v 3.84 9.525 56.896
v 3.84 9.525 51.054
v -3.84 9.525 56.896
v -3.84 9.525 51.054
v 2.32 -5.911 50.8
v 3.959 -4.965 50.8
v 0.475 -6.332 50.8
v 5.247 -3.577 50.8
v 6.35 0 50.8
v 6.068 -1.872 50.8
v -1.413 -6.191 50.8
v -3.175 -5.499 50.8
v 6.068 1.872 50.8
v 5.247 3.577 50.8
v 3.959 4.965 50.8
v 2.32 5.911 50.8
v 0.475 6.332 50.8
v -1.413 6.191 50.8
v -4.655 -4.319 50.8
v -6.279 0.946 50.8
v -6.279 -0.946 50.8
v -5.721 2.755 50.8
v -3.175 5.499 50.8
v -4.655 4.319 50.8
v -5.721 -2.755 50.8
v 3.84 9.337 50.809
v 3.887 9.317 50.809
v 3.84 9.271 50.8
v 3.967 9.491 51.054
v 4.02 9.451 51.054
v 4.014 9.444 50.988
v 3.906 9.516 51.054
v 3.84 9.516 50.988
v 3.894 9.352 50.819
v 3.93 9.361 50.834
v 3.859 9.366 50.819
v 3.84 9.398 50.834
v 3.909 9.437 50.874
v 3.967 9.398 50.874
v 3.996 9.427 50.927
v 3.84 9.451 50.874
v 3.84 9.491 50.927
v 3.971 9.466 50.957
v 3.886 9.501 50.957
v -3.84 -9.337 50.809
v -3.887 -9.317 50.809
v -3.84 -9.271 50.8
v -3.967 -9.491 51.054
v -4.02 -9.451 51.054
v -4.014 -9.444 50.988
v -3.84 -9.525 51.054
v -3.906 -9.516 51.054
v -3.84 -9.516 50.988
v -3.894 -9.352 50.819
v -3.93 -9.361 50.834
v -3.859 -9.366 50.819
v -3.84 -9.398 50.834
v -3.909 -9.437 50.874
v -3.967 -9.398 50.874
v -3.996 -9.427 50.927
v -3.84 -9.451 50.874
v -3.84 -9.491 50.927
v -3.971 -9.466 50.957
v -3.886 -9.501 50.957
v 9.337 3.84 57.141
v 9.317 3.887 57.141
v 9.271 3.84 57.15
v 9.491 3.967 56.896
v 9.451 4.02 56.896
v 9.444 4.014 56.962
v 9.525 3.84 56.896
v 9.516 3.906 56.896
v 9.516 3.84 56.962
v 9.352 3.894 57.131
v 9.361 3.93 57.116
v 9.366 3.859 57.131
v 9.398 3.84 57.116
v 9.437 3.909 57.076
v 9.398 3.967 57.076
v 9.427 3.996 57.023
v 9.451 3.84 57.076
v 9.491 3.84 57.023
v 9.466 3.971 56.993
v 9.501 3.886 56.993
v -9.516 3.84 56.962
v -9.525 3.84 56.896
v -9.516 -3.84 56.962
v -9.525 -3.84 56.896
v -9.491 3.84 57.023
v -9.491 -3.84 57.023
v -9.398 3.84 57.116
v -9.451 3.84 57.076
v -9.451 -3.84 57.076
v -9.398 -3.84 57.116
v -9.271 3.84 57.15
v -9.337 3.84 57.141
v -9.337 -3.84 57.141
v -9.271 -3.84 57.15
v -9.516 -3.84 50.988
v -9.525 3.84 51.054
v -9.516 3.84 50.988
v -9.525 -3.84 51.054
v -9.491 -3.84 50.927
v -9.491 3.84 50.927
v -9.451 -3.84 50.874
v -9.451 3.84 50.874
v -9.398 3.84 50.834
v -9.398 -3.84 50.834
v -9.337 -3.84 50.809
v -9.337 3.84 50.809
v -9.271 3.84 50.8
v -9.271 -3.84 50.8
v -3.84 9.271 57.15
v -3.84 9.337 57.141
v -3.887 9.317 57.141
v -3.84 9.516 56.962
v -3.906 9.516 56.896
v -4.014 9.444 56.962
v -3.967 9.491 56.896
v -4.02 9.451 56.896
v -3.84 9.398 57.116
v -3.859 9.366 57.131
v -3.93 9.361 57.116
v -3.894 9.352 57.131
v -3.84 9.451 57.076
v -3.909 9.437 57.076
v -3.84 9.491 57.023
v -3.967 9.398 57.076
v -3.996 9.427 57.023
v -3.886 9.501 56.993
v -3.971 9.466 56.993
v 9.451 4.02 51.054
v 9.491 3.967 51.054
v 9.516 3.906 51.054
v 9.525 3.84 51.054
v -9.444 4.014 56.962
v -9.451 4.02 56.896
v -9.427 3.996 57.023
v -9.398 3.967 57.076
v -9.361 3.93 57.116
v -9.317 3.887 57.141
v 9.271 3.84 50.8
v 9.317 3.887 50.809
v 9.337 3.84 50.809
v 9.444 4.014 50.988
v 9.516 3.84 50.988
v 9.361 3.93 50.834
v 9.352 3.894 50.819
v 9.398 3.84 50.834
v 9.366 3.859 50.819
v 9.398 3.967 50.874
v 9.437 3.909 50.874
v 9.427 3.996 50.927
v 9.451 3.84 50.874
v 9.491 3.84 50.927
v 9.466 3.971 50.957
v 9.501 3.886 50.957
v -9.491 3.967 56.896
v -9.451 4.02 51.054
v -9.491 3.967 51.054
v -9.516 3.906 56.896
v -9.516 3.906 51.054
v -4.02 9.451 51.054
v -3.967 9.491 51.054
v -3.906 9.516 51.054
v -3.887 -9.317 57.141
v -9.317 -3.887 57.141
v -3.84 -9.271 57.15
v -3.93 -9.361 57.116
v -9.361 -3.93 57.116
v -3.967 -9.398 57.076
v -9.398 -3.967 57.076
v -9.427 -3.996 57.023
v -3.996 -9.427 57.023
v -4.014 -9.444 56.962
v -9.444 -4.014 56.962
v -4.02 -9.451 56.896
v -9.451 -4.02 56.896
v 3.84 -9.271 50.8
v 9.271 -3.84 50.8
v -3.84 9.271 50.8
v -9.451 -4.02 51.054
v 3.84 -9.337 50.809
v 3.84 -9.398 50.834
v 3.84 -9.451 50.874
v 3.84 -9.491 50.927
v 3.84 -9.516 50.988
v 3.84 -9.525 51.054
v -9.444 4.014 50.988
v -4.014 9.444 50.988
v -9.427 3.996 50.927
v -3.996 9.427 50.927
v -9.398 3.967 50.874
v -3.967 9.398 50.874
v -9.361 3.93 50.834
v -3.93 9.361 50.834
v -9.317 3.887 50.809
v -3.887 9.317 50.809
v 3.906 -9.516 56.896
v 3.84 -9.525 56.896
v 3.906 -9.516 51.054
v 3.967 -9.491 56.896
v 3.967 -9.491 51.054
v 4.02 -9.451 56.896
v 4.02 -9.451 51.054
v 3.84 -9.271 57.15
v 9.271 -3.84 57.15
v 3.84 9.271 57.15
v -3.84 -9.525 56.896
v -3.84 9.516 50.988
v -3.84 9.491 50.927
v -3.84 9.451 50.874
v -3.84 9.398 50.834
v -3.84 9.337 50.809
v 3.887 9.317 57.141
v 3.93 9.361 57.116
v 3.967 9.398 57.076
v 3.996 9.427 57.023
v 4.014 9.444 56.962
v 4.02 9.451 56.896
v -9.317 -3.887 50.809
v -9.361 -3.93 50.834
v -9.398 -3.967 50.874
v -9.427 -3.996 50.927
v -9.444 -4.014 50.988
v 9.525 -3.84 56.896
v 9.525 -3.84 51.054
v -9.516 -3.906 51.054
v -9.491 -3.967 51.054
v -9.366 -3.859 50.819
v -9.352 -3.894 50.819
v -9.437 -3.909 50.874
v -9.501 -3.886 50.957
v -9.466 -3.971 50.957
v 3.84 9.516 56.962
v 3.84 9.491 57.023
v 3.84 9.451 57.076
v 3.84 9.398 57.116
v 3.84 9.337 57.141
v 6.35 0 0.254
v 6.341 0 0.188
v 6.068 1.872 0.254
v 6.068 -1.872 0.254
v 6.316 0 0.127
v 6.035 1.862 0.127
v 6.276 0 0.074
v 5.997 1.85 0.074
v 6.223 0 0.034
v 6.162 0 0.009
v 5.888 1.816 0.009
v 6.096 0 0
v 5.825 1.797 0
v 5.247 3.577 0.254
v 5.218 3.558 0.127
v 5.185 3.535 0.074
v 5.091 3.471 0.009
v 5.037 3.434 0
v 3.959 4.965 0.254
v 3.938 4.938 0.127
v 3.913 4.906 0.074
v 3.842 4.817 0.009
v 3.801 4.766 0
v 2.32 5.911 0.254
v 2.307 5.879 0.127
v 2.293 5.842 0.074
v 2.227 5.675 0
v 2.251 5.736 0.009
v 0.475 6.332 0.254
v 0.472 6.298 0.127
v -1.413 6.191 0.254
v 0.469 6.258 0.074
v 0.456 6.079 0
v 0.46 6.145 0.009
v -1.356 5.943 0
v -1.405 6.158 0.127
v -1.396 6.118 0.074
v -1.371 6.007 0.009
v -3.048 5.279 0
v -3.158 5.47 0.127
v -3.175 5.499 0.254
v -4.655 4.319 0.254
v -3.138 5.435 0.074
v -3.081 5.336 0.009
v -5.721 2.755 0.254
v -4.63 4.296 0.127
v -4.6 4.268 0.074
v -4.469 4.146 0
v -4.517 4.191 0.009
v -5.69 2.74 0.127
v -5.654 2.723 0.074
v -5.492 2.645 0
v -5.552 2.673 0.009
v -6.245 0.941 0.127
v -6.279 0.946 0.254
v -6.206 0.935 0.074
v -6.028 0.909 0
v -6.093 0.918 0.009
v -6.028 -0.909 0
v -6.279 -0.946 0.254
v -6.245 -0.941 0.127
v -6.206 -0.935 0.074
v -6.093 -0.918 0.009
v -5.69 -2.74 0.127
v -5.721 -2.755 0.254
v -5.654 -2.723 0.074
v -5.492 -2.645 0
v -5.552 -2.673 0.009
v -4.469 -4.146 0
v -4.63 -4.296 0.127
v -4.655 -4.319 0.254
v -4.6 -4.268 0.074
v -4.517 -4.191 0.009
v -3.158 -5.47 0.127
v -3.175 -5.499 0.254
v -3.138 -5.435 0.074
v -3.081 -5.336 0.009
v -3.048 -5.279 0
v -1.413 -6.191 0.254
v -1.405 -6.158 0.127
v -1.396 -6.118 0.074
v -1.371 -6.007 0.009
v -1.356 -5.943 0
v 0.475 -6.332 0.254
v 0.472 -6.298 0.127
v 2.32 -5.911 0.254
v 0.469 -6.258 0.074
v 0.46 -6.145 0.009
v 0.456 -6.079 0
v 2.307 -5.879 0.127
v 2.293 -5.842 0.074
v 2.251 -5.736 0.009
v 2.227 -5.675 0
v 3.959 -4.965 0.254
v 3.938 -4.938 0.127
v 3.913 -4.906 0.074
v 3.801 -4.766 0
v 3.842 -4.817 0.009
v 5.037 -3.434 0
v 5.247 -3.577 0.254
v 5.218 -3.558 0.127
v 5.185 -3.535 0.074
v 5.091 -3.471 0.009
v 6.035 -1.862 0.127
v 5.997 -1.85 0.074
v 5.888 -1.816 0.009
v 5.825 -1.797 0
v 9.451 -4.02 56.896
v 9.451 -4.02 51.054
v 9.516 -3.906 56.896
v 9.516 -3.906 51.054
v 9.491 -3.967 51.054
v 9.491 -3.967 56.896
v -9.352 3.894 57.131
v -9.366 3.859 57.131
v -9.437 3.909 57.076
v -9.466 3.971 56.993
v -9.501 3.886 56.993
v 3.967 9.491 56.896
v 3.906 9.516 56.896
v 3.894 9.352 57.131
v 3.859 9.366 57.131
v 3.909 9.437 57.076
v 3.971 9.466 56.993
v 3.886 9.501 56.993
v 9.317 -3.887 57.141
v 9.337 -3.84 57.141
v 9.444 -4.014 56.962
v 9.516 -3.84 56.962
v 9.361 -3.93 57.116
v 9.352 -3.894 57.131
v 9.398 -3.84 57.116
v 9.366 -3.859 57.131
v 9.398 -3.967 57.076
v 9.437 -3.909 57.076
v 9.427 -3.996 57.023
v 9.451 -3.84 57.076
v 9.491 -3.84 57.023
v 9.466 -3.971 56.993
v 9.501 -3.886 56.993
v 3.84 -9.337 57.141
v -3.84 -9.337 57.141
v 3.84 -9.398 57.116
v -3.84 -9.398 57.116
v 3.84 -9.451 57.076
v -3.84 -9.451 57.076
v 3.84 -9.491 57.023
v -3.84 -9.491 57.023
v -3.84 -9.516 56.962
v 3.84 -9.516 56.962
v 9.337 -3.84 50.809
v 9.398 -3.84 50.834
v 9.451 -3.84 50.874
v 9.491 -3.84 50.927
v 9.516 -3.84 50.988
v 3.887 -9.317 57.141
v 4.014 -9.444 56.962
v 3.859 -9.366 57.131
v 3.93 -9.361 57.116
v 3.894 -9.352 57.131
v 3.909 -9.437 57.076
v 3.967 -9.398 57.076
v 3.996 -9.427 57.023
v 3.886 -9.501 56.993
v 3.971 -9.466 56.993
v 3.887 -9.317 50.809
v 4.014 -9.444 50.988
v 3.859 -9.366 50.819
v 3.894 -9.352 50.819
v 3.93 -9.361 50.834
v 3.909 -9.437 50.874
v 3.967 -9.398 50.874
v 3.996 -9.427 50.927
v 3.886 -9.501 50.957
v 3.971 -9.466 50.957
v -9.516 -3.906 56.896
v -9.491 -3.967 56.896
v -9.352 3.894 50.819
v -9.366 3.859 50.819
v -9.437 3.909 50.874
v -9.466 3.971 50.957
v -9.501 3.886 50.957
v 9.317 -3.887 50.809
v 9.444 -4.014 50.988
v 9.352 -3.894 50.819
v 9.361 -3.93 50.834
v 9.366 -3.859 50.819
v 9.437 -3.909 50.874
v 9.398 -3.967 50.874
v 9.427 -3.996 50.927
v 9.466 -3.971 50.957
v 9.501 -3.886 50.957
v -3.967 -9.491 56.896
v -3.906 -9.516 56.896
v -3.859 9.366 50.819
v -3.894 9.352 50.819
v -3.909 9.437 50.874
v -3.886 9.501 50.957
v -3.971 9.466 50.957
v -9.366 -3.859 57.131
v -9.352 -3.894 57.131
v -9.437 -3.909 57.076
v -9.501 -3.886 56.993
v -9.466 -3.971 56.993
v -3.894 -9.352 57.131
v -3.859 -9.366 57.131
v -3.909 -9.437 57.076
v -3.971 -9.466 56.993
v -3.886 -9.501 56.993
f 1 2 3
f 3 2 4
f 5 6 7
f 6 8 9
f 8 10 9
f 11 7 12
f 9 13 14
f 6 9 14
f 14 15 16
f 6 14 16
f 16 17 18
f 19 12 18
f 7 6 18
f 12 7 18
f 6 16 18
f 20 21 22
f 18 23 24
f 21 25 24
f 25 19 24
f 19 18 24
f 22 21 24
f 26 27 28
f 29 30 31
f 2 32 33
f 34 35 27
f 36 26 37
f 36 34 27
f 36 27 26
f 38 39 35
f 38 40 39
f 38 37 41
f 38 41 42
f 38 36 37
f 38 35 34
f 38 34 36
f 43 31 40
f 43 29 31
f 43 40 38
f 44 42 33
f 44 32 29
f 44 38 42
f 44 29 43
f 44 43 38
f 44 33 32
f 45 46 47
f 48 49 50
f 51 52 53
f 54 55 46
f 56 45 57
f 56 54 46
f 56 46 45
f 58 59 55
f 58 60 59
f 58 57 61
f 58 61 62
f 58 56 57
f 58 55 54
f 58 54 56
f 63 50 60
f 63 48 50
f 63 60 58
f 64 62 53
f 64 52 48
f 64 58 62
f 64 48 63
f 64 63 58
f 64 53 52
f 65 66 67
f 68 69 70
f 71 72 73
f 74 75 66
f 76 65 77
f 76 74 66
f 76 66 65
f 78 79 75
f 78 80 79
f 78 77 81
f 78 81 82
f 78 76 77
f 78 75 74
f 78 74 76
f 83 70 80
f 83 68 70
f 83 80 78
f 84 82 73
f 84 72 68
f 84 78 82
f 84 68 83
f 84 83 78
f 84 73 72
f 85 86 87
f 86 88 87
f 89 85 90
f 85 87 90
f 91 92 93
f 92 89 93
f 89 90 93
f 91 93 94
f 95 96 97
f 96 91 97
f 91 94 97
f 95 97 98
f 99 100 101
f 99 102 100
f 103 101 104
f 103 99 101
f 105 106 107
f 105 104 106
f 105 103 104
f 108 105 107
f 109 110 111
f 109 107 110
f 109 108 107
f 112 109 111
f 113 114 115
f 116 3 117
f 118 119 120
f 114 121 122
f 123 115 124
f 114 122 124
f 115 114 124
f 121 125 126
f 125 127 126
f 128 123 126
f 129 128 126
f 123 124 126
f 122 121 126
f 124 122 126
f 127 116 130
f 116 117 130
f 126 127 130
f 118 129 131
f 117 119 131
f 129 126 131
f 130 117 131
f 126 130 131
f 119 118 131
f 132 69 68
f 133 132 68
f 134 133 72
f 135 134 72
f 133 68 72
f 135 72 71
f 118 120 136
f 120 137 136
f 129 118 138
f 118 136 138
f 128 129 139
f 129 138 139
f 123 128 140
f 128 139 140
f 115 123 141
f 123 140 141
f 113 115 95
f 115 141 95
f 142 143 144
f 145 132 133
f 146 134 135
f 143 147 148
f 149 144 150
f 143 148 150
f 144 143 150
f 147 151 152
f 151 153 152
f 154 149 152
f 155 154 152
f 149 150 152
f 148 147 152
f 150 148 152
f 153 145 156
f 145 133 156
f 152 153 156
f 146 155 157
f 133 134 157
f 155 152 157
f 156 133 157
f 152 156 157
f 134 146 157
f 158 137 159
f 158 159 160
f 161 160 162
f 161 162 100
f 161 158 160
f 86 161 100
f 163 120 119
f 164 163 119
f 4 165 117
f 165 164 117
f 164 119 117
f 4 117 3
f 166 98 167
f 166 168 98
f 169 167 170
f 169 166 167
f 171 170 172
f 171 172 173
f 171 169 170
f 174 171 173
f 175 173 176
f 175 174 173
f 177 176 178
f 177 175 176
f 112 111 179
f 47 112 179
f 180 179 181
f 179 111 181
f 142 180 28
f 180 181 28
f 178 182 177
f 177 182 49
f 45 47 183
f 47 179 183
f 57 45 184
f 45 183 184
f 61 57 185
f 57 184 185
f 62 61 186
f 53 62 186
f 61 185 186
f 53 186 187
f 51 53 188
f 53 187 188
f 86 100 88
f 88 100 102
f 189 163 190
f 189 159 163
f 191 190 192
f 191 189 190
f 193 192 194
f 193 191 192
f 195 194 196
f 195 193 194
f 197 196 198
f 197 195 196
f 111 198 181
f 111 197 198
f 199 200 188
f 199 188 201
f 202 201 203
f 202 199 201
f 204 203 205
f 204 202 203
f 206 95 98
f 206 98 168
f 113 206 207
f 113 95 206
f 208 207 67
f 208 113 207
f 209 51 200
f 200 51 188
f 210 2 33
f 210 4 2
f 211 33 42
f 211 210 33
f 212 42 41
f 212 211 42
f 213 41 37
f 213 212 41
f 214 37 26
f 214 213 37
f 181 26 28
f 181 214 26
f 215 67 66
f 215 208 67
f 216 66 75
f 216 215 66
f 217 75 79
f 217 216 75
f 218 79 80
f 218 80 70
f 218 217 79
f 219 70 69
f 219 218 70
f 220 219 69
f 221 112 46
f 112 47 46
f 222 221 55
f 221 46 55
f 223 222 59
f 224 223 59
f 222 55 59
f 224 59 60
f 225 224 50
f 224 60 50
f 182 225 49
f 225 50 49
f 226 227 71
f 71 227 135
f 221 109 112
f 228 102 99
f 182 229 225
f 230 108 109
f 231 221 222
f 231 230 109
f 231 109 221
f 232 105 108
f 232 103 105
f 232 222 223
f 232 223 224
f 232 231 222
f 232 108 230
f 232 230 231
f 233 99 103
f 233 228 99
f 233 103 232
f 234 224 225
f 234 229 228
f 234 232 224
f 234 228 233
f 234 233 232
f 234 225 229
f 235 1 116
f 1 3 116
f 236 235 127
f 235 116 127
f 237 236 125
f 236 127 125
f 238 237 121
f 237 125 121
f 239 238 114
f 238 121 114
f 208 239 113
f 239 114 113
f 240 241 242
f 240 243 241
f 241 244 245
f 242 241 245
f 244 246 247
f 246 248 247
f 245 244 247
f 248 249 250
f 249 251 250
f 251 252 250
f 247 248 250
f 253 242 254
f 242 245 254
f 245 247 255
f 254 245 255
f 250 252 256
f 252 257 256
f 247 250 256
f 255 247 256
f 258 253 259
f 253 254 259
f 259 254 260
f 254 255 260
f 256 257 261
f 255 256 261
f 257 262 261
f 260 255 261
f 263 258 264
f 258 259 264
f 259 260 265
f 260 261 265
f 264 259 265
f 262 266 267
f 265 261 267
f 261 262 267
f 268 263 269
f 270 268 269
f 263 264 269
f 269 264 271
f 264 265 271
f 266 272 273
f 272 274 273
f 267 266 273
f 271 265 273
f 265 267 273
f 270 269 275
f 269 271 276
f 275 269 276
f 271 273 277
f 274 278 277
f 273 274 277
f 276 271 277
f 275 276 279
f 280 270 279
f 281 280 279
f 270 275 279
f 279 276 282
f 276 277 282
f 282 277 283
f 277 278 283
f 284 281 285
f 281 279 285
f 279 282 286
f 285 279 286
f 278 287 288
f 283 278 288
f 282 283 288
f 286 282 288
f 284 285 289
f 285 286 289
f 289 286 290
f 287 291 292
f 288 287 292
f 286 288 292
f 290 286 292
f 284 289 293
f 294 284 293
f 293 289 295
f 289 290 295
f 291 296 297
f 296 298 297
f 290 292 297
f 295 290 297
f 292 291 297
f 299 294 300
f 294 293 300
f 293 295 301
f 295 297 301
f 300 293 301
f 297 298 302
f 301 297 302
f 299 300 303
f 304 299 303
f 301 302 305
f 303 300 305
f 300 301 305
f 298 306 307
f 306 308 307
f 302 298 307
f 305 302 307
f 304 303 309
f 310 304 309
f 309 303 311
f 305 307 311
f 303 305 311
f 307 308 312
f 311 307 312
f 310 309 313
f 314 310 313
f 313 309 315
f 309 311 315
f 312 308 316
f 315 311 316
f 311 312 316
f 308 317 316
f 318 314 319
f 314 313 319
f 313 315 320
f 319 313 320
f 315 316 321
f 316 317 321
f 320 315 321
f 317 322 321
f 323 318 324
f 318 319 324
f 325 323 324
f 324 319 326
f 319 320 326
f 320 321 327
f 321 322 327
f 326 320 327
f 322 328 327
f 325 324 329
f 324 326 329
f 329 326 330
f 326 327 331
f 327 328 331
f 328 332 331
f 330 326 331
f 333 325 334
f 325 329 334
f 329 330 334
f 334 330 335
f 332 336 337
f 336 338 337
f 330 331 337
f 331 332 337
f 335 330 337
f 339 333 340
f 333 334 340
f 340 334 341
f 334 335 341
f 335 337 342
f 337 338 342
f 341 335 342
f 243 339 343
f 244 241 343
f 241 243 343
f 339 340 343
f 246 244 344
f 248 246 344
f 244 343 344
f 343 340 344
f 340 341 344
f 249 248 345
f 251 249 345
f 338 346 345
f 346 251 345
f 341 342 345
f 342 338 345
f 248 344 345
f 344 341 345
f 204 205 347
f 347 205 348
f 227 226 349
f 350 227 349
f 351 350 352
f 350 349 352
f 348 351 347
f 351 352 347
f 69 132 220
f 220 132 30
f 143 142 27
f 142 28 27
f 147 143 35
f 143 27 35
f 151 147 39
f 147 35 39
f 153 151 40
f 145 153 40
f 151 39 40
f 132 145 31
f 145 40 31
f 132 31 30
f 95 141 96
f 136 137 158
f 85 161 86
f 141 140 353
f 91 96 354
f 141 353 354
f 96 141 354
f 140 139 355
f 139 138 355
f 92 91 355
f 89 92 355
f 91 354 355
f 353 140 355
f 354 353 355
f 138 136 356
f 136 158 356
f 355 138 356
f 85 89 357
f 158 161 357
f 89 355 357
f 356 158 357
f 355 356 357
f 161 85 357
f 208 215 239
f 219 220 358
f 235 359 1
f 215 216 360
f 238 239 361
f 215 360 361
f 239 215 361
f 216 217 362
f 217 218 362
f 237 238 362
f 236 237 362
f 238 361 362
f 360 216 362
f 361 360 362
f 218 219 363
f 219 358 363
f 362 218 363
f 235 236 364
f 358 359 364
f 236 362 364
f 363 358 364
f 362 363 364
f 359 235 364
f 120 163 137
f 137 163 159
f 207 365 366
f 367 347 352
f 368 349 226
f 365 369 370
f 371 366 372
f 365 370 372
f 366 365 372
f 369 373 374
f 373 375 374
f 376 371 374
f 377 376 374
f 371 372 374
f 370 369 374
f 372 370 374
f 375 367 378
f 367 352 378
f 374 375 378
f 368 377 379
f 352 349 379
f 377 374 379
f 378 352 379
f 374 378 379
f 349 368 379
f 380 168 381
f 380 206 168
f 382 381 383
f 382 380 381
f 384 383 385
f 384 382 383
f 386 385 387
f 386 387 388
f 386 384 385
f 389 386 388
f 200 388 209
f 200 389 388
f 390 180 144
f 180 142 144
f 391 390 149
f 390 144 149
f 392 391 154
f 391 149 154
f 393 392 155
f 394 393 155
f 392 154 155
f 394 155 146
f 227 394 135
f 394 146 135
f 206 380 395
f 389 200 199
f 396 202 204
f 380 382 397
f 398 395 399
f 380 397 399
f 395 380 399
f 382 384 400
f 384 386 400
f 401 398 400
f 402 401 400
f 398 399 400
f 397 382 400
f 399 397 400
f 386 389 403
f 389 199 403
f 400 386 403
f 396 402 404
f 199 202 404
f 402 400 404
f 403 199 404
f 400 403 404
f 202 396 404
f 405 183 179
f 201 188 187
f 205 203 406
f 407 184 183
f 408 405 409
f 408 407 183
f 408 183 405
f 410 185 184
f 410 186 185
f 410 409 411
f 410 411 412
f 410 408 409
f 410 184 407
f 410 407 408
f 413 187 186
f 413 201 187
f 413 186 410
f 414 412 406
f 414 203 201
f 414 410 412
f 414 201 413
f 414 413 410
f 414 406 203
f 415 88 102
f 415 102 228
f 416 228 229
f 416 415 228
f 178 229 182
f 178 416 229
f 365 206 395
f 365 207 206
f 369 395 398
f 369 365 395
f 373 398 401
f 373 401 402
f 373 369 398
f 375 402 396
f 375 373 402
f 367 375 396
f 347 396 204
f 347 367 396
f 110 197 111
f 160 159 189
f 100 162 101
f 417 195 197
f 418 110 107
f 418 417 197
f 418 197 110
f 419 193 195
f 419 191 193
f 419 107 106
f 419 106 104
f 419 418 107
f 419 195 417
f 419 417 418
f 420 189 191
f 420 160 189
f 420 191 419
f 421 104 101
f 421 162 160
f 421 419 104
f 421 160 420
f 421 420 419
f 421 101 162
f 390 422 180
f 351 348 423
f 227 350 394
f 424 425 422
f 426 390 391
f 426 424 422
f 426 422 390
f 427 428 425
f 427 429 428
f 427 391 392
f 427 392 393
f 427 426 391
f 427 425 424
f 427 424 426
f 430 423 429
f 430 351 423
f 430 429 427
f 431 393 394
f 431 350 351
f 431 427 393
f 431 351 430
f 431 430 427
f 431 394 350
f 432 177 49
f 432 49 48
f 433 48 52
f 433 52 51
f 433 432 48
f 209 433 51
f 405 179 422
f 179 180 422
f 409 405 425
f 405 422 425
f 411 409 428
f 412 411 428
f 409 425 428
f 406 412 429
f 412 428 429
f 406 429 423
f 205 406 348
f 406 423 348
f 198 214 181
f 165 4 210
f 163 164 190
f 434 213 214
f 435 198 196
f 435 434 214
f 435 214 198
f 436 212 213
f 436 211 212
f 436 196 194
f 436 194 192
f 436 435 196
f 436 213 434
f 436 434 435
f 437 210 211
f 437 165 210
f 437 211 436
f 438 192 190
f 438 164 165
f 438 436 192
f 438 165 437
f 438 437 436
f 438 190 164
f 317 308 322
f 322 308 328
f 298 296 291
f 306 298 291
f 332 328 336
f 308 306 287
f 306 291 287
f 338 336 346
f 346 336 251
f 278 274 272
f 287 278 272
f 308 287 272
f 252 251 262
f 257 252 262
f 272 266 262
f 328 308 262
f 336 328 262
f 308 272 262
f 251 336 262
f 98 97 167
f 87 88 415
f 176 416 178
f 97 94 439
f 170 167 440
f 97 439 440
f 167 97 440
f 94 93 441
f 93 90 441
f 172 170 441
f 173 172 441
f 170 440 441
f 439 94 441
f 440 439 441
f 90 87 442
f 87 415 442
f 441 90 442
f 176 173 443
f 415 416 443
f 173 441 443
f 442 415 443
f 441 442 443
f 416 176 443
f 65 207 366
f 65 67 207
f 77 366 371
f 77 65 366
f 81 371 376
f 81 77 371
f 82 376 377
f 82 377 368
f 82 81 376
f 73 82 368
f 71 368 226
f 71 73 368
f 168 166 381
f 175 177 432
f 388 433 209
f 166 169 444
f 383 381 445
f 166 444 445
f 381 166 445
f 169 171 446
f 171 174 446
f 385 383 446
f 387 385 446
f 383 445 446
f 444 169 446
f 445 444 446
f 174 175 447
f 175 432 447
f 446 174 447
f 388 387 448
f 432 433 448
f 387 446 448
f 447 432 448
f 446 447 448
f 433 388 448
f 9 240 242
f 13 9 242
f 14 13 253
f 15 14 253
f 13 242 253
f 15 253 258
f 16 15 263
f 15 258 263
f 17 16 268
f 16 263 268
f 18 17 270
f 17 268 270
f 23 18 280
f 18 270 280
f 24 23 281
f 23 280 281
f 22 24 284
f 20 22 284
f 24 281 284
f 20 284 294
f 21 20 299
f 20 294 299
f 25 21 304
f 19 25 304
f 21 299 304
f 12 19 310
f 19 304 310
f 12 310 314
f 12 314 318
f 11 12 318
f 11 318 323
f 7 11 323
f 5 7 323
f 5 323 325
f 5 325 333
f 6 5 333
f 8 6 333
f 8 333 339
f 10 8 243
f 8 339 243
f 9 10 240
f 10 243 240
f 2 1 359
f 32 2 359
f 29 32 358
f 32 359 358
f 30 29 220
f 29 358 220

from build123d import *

# Parameters (mm, degrees)
SKETCH1_R           = 6.35
BOSS_EXTRUDE1_DEPTH = 50.8
BOSS_EXTRUDE3_DEPTH = 6.35
FILLET1_R           = 0.254
FILLET2_R           = 0.254


with BuildPart() as part:
    # Sketch1 → Boss-Extrude1 (new body)
    with BuildSketch(Plane.XY):
        Circle(SKETCH1_R)
    extrude(amount=BOSS_EXTRUDE1_DEPTH)

    # Sketch2 → Boss-Extrude3 (add)
    with BuildSketch(Plane.XY.offset(50.8)):
        Polygon((-3.945384182, 9.525), (-9.525, 3.945384182), (-9.525, -3.945384182), (-3.945384182, -9.525), (3.945384182, -9.525), (9.525, -3.945384182), (9.525, 3.945384182), (3.945384182, 9.525), align=None)
    extrude(amount=BOSS_EXTRUDE3_DEPTH)


with BuildPart() as body_2:
    # Split1: the piece on the far side of the plane
    add(part.part)
    split(bisect_by=Plane(origin=(0, 0, 50.8), x_dir=(-1, 0, 0), z_dir=(0, 0, -1)), keep=Keep.BOTTOM)

    # Fillet1
    fillet1_edges = [body_2.edges().sort_by_distance(p)[0] for p in [
        (3.945384182, 9.525, 53.975),
        (6.735192091, 6.735192091, 50.8),
        (0, 9.525, 50.8),
        (-6.735192091, 6.735192091, 50.8),
        (-9.525, 0, 50.8),
        (-6.735192091, -6.735192091, 50.8),
        (0, -9.525, 50.8),
        (6.735192091, -6.735192091, 50.8),
        (9.525, 0, 50.8),
        (6.735192091, 6.735192091, 57.15),
        (0, 9.525, 57.15),
        (-6.735192091, 6.735192091, 57.15),
        (-9.525, 0, 57.15),
        (-6.735192091, -6.735192091, 57.15),
        (0, -9.525, 57.15),
        (6.735192091, -6.735192091, 57.15),
        (9.525, 0, 57.15),
        (9.525, 3.945384182, 53.975),
        (9.525, -3.945384182, 53.975),
        (3.945384182, -9.525, 53.975),
        (-3.945384182, -9.525, 53.975),
        (-9.525, -3.945384182, 53.975),
        (-9.525, 3.945384182, 53.975),
        (-3.945384182, 9.525, 53.975),
    ]]
    fillet(fillet1_edges, radius=FILLET1_R)


with BuildPart() as part_1:
    add(part.part)

    # Split1
    split(bisect_by=Plane(origin=(0, 0, 50.8), x_dir=(-1, 0, 0), z_dir=(0, 0, -1)), keep=Keep.TOP)

    # Fillet2
    fillet2_edges = [part_1.edges().sort_by_distance(p)[0] for p in [
        (-6.35, 0, 0),
    ]]
    fillet(fillet2_edges, radius=FILLET2_R)


solid = Compound([body_2.part, part_1.part])
